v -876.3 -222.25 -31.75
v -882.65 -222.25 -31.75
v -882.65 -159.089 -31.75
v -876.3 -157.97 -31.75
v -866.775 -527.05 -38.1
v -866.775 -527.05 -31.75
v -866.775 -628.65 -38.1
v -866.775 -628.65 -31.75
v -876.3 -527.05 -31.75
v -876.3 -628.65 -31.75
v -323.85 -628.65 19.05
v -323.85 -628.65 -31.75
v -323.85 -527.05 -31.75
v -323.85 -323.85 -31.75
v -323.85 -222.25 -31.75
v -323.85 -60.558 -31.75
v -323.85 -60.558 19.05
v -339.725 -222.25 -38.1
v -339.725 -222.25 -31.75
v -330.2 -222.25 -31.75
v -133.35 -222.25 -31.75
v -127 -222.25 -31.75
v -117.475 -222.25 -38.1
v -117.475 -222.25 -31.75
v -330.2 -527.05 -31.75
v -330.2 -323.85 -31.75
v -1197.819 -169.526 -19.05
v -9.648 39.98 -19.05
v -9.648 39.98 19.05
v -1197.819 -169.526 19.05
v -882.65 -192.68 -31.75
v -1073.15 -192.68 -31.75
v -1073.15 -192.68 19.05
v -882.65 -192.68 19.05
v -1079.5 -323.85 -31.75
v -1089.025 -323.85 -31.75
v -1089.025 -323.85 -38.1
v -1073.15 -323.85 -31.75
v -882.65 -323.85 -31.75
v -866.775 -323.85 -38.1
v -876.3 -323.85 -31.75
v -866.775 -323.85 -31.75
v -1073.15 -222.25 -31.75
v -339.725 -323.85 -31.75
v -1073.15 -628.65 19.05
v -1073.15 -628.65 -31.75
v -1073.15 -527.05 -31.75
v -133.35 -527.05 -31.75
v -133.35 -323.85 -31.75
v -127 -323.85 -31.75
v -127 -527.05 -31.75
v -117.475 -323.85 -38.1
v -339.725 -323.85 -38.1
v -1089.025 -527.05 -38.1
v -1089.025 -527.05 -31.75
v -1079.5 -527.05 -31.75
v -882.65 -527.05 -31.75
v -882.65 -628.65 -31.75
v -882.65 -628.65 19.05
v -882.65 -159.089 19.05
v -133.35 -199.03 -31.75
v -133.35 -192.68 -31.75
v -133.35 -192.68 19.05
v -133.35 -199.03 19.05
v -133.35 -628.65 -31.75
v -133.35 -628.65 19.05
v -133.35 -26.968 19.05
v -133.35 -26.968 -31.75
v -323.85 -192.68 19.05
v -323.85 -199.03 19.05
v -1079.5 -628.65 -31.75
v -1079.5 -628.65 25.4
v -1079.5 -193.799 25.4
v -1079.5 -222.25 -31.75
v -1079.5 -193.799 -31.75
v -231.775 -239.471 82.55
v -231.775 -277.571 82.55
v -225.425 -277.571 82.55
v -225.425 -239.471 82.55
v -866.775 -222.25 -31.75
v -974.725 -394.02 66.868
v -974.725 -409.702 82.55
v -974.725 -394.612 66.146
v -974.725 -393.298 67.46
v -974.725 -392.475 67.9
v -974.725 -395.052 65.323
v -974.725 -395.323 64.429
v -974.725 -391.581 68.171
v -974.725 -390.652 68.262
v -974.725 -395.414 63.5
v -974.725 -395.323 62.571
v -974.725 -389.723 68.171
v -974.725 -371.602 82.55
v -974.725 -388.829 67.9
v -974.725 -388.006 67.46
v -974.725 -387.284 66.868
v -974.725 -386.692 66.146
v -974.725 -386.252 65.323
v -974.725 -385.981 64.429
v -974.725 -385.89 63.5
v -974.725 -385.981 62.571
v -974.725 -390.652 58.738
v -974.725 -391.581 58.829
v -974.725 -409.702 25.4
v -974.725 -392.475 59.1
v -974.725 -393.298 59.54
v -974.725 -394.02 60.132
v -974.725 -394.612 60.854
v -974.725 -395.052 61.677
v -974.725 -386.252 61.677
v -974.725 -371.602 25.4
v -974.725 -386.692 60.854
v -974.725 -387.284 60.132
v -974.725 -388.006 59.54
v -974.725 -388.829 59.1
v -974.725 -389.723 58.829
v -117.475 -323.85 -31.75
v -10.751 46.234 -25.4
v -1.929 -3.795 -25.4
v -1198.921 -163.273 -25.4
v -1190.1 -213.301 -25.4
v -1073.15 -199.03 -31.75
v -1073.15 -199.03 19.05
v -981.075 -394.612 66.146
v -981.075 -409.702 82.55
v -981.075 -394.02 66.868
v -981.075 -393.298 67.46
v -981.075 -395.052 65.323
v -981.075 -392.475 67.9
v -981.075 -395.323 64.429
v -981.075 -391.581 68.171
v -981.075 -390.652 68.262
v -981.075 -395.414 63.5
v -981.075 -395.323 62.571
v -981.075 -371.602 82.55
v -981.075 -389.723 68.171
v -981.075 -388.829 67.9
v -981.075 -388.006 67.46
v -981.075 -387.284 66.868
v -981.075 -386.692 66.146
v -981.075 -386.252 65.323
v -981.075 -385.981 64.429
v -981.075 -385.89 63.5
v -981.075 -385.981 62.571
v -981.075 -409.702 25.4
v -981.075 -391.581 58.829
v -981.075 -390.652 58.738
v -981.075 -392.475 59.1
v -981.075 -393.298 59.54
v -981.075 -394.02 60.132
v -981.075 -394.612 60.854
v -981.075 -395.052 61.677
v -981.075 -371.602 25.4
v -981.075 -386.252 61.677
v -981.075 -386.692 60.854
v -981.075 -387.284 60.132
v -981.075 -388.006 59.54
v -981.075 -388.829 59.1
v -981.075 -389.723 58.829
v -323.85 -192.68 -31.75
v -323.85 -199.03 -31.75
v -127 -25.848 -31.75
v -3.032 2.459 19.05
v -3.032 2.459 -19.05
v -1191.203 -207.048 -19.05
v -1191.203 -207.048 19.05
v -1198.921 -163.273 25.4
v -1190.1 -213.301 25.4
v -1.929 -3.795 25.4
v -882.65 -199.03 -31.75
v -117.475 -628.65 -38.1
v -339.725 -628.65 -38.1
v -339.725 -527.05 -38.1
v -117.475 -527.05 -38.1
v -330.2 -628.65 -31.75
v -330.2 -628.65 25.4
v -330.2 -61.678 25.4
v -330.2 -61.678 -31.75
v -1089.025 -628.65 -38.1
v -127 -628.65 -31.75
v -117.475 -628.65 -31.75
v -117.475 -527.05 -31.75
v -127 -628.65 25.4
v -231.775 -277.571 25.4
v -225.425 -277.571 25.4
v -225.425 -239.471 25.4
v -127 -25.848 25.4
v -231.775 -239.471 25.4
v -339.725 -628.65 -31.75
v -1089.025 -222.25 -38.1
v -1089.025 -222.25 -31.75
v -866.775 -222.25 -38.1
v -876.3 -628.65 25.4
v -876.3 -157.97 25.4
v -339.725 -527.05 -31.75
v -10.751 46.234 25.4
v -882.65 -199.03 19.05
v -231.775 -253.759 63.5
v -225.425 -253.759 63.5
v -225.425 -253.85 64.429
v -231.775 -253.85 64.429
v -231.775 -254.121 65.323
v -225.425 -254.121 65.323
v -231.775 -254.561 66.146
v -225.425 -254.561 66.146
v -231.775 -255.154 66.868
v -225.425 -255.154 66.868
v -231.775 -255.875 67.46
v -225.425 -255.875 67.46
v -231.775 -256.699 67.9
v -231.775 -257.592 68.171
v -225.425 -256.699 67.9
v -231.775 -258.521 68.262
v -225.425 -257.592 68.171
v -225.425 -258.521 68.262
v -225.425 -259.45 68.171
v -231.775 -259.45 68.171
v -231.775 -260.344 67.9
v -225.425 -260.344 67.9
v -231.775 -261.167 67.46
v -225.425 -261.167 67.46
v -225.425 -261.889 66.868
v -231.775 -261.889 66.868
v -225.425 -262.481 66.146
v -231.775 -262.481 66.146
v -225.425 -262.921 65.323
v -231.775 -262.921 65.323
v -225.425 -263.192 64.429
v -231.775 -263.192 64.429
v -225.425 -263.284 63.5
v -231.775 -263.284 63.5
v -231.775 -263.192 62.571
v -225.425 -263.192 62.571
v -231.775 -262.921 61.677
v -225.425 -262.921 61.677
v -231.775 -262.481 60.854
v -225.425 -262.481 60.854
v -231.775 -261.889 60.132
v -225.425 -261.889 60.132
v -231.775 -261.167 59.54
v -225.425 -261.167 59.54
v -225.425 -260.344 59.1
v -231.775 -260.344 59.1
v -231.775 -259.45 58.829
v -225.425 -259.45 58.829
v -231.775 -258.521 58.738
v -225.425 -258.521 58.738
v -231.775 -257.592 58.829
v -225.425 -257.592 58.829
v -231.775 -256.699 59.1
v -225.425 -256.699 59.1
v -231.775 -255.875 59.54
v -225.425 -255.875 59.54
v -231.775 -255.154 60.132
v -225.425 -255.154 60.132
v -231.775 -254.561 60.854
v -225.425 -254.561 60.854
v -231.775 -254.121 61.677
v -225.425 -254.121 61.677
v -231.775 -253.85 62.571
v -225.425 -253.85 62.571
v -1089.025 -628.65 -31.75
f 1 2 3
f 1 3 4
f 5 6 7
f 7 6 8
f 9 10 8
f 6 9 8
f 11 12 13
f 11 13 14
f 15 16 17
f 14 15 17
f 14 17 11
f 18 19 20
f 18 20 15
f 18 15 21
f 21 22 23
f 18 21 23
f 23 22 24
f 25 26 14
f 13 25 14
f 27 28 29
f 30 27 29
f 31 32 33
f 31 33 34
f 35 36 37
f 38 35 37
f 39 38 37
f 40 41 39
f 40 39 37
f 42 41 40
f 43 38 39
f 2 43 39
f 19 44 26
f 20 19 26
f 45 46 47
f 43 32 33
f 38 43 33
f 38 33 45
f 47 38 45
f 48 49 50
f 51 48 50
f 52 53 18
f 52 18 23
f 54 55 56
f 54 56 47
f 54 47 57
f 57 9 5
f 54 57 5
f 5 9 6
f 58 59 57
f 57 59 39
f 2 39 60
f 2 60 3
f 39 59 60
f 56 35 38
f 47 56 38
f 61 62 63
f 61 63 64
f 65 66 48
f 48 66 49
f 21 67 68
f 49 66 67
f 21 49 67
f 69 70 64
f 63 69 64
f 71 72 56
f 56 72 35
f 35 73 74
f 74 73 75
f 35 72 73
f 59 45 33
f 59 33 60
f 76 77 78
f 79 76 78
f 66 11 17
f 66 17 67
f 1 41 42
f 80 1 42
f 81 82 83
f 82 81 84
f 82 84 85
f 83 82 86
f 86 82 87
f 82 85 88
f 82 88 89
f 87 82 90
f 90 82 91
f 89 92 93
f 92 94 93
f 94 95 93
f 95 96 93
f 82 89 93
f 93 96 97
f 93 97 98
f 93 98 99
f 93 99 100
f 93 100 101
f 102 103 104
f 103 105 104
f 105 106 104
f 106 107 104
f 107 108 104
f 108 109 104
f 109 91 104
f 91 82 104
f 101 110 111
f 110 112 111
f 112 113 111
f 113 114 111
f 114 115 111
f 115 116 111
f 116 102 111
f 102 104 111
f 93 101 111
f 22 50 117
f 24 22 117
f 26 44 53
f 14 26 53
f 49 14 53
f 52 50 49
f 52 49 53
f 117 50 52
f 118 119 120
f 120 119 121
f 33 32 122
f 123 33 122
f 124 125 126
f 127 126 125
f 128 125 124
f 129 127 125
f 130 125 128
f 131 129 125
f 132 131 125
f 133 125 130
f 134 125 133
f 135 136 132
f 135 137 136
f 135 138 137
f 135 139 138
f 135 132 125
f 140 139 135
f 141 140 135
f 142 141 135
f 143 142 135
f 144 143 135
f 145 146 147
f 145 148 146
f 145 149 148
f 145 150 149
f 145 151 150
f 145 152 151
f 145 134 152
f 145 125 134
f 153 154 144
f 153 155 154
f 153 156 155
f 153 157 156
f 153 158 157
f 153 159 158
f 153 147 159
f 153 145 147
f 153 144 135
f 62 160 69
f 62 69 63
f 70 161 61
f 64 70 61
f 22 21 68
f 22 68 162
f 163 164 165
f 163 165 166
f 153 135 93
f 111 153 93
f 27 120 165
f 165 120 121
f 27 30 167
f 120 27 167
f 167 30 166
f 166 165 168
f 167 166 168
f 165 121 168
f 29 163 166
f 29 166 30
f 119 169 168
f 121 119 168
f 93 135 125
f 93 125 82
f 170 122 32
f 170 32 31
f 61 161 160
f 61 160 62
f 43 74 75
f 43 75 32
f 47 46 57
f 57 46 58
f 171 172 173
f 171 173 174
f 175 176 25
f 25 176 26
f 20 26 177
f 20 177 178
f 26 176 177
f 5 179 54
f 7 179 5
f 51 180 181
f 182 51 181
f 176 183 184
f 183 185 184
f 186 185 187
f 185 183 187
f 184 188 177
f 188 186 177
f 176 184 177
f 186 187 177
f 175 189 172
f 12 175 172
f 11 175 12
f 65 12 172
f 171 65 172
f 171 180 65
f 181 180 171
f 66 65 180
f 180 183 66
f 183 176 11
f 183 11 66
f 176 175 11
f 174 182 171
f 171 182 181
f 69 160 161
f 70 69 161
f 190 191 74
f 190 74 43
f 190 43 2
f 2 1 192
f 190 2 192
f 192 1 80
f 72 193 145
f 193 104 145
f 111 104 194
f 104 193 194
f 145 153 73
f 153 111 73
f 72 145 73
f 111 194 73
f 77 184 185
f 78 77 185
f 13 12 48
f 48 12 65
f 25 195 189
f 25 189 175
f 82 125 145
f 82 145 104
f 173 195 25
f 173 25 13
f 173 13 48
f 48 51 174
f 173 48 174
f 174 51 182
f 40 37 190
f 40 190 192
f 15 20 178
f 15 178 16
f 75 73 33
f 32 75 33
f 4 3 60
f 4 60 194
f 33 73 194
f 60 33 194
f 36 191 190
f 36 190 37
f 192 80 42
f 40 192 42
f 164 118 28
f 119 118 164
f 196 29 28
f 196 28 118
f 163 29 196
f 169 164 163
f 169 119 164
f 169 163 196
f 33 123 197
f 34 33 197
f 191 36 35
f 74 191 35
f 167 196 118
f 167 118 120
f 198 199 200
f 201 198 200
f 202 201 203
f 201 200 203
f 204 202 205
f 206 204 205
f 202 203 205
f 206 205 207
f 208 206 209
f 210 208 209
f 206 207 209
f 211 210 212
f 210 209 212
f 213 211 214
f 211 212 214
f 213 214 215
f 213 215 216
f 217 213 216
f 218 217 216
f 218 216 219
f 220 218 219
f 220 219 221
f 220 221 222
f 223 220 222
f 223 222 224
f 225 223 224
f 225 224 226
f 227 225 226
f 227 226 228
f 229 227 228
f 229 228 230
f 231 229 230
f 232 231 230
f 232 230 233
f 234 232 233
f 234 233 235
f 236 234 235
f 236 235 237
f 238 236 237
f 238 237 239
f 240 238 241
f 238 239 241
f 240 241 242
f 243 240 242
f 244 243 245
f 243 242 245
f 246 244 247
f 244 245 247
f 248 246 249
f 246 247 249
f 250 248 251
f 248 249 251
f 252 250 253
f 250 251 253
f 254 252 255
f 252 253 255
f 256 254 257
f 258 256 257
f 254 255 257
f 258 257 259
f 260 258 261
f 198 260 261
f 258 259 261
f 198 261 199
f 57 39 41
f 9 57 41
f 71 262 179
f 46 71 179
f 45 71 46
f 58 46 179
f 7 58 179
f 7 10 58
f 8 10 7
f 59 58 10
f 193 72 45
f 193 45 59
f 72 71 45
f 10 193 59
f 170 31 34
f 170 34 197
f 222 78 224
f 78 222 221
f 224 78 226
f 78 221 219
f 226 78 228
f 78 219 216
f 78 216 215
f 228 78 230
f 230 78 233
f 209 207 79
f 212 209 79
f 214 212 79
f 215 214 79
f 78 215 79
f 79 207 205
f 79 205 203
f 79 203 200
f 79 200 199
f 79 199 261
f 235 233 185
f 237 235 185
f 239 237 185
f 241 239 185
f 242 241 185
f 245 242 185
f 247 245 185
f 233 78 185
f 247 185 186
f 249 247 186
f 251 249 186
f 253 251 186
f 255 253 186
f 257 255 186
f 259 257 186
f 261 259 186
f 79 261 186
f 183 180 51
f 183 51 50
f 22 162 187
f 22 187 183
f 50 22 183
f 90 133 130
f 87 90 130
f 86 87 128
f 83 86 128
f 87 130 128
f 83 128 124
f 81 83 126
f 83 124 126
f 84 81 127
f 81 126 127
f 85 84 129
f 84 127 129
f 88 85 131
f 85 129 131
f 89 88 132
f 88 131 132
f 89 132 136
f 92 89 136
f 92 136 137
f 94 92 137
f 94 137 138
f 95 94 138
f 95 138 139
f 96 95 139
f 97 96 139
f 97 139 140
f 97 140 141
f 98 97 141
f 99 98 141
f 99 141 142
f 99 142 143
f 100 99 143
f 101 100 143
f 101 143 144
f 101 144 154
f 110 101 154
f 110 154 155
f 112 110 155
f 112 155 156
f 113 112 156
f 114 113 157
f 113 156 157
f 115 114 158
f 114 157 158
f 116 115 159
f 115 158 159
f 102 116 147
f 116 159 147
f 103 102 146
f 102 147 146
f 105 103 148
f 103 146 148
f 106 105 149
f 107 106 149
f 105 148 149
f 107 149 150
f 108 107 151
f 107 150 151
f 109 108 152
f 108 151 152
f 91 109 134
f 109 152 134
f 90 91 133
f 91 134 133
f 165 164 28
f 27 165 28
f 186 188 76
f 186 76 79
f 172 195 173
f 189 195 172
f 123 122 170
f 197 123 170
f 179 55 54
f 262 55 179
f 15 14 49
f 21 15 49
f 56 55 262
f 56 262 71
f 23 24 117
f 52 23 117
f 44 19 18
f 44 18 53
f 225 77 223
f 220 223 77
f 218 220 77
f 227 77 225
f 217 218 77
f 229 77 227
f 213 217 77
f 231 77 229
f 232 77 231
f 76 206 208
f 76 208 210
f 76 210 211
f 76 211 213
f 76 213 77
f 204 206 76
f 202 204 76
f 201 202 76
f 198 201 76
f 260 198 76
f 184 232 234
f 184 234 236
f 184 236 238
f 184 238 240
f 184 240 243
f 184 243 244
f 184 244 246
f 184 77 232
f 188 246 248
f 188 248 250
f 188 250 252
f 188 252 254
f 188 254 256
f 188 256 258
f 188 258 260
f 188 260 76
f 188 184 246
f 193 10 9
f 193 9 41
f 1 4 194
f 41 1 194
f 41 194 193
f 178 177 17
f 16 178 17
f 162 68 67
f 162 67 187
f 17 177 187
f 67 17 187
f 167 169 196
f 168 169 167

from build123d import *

# Parameters (mm, degrees)
F0_W      = 50.8
F0_H      = 50.8
F0_W_2    = 38.1
F0_H_2    = 38.1
F1_DEPTH  = 1206.5
F4_DEPTH  = 603.25
F5_W      = 222.25
F5_H      = 101.6
F6_DEPTH  = 6.35
F7_W      = 6.35
F7_H      = 38.1
F8_DEPTH  = 57.15
F9_R      = 4.7625
F10_DEPTH = 762
F12_DEPTH = 127
F13_W     = 1206.5
F13_H     = 50.8
F14_DEPTH = 127
F15_W     = 1206.5
F15_H     = 50.8
F16_DEPTH = 50.8
F17_W     = 38.1
F17_H     = 38.1
F18_DEPTH = 1270
F19_W     = 190.5
F19_H     = 6.35
F20_DEPTH = 50.8
F21_R     = 4.7625
F22_DEPTH = 25.4


with BuildPart() as f1:
    # F0 (on Right) → F1 (new body)
    with BuildSketch(Plane.YZ):
        Rectangle(F0_W, F0_H)
        Rectangle(F0_W_2, F0_H_2, mode=Mode.SUBTRACT)
    extrude(amount=-F1_DEPTH)

    # F3 (on offset) → F4 (join)
    with BuildSketch(Plane.XZ.offset(25.4)):
        Polygon((-876.3, 25.4), (-1079.5, 25.4), (-1079.5, -31.75), (-1073.15, -31.75), (-1073.15, 19.05), (-882.65, 19.05), (-882.65, -31.75), (-876.3, -31.75), align=None)
        Polygon((-127, -31.75), (-127, 25.4), (-330.2, 25.4), (-330.2, -31.75), (-323.85, -31.75), (-323.85, 19.05), (-133.35, 19.05), (-133.35, -31.75), align=None)
    extrude(amount=F4_DEPTH)

    # F5 (on face) → F6 (join)
    with BuildSketch(Plane(origin=(0, 0, -31.75), x_dir=(1, 0, 0), z_dir=(0, 0, -1))):
        with Locations((-228.6, 273.05)):
            Rectangle(F5_W, F5_H)
        with Locations((-228.6, 577.85)):
            Rectangle(F5_W, F5_H)
        with Locations((-977.9, 273.05)):
            Rectangle(F5_W, F5_H)
        with Locations((-977.9, 577.85)):
            Rectangle(F5_W, F5_H)
    extrude(amount=F6_DEPTH)

    # F7 (on face) → F8 (join)
    with BuildSketch(Plane.XY.offset(25.4)):
        with Locations((-228.6, -258.5212)):
            Rectangle(F7_W, F7_H)
        with Locations((-977.9, -390.652)):
            Rectangle(F7_W, F7_H)
    extrude(amount=F8_DEPTH)

    # F9 (on face) → F10 (cut)
    with BuildSketch(Plane.YZ.offset(-225.425)):
        with Locations((-258.5212, 63.5)):
            Circle(F9_R)
    extrude(amount=-F10_DEPTH, mode=Mode.SUBTRACT)

    # F11 (on face) → F12 (cut)
    with BuildSketch(Plane.XY.offset(25.4)):
        Polygon((-1079.5, -25.4), (-1079.5, -193.3514491248), (-1079.5, -193.7993196558), (-876.3, -157.9696771759), (-876.3, -25.4), align=None)
        Polygon((-127, -25.4), (-330.2, -25.4), (-330.2, -61.677513011), (-127, -25.847870531), align=None)
        Polygon((-330.2, -25.4), (-876.3, -25.4), (-876.3, -157.9696771759), (-330.2, -61.677513011), align=None)
    extrude(amount=-F12_DEPTH, mode=Mode.SUBTRACT)

    # F13 (on face) → F14 (cut)
    with BuildSketch(Plane.XY.offset(25.4)):
        Polygon((23.5653109848, 38.0831770599), (-1219.6669578552, 38.0831770599), (-1219.6669578552, -25.4), (-1206.5, -25.4), (-1206.5, 25.4), (0, 25.4), (0, -25.4), (23.5653109848, -25.4), align=None)
        with Locations((-603.25, 0)):
            Rectangle(F13_W, F13_H)
    extrude(amount=-F14_DEPTH, mode=Mode.SUBTRACT)

    # F21 (on face) → F22 (cut)
    with BuildSketch(Plane(origin=(-981.075, 0, 0), x_dir=(0, -1, 0), z_dir=(-1, 0, 0))):
        with Locations((390.652, 63.5)):
            Circle(F21_R)
    extrude(amount=-F22_DEPTH, mode=Mode.SUBTRACT)


with BuildPart() as f16:
    # F15 (on face) → F16 (new body)
    with BuildSketch(Plane(origin=(0.5907276117, -3.3501827648, 0), x_dir=(-0.984807753, -0.1736481777, 0), z_dir=(-0.1736481777, 0.984807753, 0))):
        with Locations((605.8090202468, 0)):
            Rectangle(F15_W, F15_H)
    extrude(amount=F16_DEPTH)

    # F17 (on face) → F18 (cut)
    with BuildSketch(Plane(origin=(-2.5201429792, -0.4443692025, 0), x_dir=(-0.1736481777, 0.984807753, 0), z_dir=(0.984807753, 0.1736481777, 0))):
        with Locations((21.9981352659, 0)):
            Rectangle(F17_W, F17_H)
    extrude(amount=-F18_DEPTH, mode=Mode.SUBTRACT)


with BuildPart() as f20:
    # F19 (on face) → F20 (new body, through all)
    with BuildSketch(Plane(origin=(0, 0, -31.75), x_dir=(1, 0, 0), z_dir=(0, 0, -1))):
        with Locations((-977.9, 195.8546433283)):
            Rectangle(F19_W, F19_H)
    extrude(amount=-F20_DEPTH)


with BuildPart() as f20b:
    # F19 (on face) → F20, piece 2 (new body, through all)
    with BuildSketch(Plane(origin=(0, 0, -31.75), x_dir=(1, 0, 0), z_dir=(0, 0, -1))):
        with Locations((-228.6, 195.8546433283)):
            Rectangle(F19_W, F19_H)
    extrude(amount=-F20_DEPTH)


solid = Compound([f1.part, f16.part, f20.part, f20b.part])
